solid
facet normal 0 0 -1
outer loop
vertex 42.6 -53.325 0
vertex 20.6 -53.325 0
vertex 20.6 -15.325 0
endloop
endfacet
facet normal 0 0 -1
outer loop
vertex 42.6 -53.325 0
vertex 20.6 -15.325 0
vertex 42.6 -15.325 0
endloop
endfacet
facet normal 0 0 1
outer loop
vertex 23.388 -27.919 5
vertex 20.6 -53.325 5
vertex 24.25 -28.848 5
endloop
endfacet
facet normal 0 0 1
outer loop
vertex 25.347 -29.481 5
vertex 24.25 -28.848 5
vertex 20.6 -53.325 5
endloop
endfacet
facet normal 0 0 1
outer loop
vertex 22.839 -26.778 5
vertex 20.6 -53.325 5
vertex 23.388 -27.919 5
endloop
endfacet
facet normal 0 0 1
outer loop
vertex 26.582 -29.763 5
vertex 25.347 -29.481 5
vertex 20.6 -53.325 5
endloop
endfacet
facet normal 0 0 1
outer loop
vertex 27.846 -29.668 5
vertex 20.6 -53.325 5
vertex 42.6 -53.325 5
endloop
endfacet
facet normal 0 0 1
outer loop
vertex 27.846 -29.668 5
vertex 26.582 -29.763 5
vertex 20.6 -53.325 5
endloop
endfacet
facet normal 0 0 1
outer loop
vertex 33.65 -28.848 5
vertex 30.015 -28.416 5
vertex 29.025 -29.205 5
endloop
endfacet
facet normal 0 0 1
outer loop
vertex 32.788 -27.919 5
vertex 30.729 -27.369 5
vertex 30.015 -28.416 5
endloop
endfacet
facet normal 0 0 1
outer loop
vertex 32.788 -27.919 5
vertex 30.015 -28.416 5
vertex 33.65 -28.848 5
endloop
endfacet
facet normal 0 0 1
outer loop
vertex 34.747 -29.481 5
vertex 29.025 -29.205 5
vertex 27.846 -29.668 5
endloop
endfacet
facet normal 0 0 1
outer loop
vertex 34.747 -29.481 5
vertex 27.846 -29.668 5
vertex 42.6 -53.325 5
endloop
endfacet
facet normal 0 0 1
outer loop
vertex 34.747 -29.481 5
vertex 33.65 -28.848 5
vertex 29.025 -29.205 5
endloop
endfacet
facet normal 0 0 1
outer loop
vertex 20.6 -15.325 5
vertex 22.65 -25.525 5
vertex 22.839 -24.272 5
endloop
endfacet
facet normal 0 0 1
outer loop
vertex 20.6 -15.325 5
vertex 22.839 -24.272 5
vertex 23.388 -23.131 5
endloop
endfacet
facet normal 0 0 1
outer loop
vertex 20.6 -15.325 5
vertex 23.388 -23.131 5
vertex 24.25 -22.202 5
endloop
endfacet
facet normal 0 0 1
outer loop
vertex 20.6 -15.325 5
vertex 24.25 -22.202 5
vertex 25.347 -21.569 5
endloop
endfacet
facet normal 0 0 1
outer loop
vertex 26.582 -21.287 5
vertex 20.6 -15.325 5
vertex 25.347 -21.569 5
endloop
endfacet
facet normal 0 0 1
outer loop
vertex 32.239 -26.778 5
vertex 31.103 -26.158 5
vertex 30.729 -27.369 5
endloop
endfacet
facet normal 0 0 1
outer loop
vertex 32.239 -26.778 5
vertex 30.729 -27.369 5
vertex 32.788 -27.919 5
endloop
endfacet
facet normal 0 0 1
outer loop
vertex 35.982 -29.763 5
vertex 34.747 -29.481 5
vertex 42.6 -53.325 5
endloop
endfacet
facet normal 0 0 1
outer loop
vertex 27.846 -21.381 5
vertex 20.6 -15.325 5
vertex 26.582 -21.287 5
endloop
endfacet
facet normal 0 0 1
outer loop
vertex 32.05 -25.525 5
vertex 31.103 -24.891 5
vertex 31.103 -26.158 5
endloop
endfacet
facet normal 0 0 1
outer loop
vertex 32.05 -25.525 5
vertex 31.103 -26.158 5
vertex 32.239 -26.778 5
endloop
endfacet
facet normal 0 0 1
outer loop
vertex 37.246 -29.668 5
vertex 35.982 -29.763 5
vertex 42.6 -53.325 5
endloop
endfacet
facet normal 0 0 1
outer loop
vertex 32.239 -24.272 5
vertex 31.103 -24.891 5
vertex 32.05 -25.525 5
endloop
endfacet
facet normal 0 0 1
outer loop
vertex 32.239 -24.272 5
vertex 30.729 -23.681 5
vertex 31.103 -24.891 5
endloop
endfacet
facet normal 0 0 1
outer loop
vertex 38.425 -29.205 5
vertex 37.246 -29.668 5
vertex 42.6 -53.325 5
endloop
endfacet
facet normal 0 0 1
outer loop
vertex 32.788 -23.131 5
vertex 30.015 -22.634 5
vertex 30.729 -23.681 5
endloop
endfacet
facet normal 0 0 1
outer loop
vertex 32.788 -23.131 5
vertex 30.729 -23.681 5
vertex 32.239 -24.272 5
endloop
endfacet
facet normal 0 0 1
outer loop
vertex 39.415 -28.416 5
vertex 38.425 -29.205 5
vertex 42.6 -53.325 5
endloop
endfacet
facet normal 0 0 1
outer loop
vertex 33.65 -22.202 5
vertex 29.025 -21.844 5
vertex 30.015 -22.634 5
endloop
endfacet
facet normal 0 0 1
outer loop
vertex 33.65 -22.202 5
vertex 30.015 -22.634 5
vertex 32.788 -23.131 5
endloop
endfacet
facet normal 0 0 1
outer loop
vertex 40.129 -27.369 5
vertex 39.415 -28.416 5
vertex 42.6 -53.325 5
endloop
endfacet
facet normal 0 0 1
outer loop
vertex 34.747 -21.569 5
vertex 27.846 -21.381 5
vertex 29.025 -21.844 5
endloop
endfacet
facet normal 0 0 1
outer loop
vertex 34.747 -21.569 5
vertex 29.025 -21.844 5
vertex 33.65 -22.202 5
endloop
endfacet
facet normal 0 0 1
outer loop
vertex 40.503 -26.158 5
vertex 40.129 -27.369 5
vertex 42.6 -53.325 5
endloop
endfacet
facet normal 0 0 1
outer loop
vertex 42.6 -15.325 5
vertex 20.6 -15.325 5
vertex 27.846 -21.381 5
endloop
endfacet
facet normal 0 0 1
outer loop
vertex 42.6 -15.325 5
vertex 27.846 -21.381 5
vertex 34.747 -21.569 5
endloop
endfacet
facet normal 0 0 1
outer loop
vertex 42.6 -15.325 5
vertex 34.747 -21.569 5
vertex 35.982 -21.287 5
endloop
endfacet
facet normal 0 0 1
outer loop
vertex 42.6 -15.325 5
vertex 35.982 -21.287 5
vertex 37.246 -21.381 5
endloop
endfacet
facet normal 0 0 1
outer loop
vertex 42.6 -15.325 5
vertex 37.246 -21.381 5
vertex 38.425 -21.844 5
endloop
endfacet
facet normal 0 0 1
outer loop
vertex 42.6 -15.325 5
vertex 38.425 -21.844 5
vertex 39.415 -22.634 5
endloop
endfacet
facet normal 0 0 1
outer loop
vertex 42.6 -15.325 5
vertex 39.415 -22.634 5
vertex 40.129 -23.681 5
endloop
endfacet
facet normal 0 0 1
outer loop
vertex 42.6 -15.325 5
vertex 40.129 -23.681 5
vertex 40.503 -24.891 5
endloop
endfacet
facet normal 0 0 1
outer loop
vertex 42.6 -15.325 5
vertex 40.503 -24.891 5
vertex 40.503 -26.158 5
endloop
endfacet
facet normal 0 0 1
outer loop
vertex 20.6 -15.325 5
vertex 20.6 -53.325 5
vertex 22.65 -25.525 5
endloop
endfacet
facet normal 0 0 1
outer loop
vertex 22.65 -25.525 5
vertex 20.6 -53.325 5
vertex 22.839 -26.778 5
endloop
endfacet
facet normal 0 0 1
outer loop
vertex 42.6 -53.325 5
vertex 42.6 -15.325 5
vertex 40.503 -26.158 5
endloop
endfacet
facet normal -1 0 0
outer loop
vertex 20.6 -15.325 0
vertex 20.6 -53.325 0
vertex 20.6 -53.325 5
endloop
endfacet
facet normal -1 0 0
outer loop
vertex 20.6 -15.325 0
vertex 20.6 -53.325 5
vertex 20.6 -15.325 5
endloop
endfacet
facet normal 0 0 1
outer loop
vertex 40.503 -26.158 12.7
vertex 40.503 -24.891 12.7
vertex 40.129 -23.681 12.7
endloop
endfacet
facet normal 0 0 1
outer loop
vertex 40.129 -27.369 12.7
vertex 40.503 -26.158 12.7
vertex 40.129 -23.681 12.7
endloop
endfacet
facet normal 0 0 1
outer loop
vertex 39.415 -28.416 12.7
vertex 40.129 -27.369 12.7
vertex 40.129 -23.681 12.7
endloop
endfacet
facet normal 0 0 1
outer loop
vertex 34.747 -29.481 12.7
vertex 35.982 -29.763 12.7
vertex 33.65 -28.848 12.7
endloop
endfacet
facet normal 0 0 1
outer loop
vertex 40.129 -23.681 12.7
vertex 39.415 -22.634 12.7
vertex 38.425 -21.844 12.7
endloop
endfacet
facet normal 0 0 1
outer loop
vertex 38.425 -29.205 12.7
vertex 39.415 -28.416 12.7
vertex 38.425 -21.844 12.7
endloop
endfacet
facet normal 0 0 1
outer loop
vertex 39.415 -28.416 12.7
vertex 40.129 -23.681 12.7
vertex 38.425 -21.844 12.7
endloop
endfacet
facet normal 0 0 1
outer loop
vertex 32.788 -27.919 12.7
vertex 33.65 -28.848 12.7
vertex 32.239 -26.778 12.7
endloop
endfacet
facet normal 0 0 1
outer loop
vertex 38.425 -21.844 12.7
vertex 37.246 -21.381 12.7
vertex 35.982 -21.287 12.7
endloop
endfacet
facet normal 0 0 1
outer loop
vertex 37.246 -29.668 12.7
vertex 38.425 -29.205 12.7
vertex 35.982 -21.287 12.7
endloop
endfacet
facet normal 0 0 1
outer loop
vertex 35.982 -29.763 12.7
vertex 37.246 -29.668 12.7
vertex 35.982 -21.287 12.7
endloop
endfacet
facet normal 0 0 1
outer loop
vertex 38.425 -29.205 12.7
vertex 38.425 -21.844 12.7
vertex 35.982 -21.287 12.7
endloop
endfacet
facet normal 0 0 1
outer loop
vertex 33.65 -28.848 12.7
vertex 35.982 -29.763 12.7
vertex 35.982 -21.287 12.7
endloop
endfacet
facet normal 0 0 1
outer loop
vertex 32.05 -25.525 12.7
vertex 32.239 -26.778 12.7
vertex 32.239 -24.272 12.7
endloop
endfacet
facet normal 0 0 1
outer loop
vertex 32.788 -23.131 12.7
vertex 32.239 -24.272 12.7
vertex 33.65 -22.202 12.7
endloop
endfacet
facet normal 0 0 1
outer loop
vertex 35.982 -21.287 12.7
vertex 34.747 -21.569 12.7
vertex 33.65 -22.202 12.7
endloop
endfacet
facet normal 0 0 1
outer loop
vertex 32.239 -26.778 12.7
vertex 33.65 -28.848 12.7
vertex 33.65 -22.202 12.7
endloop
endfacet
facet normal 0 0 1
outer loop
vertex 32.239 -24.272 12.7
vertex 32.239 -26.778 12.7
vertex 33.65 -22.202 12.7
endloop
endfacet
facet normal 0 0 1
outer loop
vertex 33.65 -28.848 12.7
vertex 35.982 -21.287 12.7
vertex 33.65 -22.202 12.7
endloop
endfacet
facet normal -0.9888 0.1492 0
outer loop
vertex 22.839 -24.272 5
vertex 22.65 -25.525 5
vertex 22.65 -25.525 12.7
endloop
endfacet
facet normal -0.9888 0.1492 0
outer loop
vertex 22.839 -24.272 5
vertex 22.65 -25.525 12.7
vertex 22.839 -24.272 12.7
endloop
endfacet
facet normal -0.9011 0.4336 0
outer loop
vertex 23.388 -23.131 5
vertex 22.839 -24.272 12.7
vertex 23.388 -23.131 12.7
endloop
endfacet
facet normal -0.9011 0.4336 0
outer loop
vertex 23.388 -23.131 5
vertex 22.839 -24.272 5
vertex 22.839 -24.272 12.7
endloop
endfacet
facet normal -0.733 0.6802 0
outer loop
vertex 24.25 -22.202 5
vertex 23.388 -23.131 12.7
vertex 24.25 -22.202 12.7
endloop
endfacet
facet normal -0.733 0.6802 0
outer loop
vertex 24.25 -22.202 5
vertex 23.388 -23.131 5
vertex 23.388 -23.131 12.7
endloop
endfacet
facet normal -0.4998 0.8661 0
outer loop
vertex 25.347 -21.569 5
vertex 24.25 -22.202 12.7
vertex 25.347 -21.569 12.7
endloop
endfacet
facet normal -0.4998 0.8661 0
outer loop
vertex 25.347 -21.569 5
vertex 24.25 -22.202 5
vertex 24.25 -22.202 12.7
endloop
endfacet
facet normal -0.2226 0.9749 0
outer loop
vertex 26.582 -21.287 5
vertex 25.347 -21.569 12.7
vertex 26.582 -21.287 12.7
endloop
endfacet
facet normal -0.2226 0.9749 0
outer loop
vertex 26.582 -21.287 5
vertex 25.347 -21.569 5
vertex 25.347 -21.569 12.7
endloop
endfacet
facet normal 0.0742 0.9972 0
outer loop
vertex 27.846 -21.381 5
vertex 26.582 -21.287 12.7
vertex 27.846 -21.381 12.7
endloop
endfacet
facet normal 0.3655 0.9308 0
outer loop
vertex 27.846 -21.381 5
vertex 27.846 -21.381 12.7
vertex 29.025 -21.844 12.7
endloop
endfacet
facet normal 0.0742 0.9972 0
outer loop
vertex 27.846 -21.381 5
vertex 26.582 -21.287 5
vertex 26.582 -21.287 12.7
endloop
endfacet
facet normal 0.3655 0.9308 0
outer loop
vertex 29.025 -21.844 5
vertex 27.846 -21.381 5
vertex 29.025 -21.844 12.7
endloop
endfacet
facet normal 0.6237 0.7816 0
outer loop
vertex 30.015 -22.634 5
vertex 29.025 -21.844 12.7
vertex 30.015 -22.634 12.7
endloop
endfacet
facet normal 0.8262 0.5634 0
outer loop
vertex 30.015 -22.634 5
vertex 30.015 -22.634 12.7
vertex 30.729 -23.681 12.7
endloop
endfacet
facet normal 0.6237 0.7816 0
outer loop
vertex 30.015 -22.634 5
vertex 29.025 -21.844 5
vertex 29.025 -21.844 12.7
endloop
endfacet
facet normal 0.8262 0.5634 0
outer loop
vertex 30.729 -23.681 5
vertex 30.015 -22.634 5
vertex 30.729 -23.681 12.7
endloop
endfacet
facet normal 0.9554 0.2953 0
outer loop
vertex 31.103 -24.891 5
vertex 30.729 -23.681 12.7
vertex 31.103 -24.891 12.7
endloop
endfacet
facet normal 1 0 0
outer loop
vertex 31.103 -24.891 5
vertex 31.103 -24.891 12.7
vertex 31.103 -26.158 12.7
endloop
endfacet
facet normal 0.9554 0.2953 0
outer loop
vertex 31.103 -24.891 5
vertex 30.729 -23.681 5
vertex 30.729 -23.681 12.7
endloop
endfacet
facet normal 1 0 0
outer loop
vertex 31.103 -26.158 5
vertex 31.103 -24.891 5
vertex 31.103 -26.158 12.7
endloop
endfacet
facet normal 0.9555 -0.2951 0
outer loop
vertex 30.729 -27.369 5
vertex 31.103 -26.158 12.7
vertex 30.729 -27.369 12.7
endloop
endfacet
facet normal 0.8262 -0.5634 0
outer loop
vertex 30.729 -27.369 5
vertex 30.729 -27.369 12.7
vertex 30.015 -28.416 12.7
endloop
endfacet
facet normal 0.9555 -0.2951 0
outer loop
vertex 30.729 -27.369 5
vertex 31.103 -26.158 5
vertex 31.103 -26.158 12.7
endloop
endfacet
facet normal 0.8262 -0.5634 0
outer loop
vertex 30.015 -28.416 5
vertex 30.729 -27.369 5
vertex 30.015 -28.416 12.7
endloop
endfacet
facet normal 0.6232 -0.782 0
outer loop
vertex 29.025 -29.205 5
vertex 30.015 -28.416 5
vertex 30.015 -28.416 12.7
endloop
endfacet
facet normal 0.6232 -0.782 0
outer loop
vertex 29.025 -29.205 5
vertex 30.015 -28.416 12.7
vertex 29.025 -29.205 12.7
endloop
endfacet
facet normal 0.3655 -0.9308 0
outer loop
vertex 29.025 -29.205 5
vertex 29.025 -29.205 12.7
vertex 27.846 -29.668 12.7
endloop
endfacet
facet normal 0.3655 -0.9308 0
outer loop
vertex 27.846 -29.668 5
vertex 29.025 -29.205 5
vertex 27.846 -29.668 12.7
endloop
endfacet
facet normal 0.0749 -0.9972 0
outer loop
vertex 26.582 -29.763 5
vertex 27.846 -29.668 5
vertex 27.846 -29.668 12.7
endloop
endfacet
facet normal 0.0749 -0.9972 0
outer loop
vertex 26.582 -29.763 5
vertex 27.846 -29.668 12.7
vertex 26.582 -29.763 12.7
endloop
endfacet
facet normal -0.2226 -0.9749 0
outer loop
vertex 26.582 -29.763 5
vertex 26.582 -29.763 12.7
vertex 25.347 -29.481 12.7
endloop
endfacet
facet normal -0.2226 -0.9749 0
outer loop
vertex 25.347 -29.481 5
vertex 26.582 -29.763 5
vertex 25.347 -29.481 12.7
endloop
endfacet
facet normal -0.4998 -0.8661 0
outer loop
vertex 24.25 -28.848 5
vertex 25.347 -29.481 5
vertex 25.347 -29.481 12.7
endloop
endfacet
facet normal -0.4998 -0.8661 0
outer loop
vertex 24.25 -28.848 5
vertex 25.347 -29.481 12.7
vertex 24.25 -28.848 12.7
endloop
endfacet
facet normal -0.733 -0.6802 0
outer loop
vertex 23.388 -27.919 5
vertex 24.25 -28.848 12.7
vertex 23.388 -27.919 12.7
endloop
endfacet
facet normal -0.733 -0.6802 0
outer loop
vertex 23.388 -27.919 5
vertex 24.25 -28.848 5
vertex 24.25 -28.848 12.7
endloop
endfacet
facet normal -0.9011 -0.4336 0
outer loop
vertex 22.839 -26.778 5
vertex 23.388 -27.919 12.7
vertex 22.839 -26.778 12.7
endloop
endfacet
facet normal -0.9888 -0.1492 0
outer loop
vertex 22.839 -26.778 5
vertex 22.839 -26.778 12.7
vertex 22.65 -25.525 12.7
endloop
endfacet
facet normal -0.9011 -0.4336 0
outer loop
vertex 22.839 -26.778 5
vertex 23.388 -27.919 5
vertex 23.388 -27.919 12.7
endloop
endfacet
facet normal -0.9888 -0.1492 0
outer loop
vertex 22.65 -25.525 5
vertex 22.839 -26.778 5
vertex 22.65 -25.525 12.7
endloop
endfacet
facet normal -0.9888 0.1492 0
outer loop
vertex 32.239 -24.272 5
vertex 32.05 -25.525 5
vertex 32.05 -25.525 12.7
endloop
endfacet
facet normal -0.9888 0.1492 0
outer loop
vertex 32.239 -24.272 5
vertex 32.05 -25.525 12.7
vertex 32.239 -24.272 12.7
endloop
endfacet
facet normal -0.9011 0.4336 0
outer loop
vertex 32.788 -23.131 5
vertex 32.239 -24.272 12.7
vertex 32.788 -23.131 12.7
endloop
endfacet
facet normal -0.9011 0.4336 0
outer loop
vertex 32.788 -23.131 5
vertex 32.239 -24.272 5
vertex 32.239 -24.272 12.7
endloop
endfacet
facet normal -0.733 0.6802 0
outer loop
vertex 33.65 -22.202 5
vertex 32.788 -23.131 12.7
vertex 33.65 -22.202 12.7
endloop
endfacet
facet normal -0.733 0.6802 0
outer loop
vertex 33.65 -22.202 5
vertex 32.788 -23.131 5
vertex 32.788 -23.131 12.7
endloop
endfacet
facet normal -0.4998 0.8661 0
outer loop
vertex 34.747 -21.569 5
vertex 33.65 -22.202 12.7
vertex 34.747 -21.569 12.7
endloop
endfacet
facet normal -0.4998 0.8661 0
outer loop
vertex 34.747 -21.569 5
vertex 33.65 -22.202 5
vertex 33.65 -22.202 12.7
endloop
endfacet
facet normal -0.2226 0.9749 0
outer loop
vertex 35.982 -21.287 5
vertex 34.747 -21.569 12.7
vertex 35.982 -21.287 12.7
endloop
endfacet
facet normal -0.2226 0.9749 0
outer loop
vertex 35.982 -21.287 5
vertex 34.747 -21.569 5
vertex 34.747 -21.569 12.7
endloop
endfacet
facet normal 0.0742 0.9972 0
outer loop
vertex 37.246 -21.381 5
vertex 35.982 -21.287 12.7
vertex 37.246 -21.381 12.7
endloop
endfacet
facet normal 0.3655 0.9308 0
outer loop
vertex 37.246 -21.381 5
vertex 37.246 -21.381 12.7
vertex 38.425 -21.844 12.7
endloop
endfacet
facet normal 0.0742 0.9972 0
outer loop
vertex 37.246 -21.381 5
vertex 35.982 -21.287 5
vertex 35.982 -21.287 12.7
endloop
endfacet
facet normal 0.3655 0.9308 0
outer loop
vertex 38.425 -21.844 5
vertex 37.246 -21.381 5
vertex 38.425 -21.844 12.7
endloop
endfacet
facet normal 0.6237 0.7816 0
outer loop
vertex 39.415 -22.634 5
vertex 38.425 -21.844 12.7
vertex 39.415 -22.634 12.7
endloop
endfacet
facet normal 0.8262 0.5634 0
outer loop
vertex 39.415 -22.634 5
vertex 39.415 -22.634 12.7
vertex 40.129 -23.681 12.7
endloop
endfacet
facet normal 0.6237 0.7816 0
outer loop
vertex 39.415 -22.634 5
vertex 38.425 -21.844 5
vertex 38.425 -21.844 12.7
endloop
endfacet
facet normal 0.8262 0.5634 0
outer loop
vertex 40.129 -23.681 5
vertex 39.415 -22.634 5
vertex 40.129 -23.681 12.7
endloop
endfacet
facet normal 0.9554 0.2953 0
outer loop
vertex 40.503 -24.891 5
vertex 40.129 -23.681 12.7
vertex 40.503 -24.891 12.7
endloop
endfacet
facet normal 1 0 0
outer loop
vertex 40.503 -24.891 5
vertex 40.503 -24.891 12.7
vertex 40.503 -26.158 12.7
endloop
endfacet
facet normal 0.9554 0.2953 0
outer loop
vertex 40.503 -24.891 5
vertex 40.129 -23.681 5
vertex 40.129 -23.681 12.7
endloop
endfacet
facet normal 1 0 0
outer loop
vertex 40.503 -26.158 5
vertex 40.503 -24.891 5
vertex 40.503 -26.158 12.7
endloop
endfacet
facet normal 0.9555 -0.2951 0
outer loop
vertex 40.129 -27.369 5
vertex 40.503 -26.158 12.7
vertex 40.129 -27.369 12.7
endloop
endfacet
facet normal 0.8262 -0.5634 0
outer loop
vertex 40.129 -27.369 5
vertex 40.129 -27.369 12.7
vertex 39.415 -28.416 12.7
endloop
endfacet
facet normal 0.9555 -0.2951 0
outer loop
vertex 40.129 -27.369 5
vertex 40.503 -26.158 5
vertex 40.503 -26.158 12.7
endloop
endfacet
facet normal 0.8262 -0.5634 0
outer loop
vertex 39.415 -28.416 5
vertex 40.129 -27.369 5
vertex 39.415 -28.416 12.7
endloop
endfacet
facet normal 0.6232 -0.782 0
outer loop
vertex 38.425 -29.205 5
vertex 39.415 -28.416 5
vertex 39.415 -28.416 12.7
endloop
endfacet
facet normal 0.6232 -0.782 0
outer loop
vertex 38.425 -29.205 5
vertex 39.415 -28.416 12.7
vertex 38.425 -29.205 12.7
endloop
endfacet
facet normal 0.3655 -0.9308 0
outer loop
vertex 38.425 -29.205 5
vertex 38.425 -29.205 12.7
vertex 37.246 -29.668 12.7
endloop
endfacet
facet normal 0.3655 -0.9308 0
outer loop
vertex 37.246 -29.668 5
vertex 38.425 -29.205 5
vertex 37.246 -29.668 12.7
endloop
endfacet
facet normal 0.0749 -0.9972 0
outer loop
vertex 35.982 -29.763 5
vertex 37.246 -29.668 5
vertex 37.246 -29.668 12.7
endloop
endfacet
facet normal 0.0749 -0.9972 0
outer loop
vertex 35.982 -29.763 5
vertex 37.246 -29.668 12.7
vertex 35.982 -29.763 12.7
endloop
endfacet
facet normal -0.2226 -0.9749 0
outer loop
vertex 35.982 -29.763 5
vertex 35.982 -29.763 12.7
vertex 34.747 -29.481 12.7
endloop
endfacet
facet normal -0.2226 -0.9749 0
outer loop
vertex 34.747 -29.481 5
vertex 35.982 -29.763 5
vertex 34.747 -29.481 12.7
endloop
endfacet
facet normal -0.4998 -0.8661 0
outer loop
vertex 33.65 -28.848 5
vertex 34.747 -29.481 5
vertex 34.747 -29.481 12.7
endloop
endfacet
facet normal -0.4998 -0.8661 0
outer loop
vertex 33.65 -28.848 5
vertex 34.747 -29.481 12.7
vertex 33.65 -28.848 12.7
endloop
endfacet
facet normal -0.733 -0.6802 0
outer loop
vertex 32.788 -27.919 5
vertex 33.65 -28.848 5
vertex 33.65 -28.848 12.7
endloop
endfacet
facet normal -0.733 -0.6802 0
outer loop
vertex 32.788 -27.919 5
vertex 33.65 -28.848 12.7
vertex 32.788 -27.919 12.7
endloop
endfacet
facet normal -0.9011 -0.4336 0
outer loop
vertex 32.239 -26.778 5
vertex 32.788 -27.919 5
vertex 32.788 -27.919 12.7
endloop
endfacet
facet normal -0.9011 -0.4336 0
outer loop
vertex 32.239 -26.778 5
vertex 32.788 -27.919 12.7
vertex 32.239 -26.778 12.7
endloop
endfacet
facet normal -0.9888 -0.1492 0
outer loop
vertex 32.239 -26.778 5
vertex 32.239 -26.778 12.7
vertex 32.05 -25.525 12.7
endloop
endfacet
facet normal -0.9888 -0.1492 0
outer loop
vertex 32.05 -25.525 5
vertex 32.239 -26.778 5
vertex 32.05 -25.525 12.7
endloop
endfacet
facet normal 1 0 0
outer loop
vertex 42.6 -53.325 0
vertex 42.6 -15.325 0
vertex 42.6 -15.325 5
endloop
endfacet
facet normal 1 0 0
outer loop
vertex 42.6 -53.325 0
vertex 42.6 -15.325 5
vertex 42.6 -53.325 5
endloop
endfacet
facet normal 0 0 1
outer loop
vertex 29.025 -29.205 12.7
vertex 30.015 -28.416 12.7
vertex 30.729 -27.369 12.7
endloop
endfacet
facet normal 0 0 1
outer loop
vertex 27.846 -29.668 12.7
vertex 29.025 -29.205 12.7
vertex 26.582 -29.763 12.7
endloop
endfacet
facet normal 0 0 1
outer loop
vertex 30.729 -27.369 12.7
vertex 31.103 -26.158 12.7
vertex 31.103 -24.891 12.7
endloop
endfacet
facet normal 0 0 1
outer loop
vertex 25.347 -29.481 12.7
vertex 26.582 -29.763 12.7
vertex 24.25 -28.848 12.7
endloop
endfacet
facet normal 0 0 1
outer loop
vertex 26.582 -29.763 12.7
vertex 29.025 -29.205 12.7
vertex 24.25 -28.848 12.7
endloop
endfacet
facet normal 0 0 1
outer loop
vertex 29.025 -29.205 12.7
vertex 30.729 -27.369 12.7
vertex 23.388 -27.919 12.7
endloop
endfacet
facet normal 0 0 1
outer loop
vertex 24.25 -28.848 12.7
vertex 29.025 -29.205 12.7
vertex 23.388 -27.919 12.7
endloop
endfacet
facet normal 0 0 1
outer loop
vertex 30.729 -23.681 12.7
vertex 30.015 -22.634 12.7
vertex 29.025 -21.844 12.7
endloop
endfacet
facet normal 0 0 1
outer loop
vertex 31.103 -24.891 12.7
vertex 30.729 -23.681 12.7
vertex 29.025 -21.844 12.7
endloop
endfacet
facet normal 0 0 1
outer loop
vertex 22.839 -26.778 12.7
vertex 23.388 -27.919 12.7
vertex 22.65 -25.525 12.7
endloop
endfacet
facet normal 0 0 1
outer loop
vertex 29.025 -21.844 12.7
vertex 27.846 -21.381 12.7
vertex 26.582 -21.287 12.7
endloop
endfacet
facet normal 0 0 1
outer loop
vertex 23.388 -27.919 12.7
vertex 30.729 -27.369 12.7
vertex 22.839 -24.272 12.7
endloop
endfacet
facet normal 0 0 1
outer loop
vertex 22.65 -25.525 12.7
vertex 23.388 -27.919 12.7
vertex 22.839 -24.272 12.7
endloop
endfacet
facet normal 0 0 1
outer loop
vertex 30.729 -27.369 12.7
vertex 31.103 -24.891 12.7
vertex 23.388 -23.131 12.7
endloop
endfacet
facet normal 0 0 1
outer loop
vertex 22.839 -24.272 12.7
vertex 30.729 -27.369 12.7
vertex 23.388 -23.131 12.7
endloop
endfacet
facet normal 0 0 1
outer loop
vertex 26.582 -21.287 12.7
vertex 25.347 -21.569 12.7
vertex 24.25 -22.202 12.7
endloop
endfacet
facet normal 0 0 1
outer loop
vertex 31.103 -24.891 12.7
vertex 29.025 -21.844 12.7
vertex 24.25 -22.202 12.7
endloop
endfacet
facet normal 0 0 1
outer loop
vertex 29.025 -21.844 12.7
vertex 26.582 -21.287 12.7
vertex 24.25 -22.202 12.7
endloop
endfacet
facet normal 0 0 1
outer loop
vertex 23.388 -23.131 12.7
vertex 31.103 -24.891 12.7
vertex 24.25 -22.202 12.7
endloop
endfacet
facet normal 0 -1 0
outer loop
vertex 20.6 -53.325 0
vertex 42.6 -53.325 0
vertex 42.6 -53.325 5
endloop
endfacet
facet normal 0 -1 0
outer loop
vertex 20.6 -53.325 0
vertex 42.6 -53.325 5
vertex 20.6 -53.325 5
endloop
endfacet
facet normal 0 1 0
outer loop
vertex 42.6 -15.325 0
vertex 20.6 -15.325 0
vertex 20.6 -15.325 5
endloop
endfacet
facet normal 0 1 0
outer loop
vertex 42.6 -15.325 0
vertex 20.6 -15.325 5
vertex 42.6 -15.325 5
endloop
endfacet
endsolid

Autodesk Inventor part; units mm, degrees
ref_plane "YZ Plane" through (0, 0, 0) normal (1, 0, 0) x (0, 1, 0)
ref_plane "XZ Plane" through (0, 0, 0) normal (0, 1, 0) x (-1, 0, 0)
ref_plane "XY Plane" through (0, 0, 0) normal (0, 0, 1) x (1, 0, 0)
sketch "スケッチ1" plane through (0, 0, 0) normal (0, 0, 1) x (1, 0, 0)
  line L0 (0, 0) -> (62, 0) construction
  line L1 (62, 0) -> (62, -62) construction
  line L2 (62, -62) -> (0, -62) construction
  line L3 (0, -62) -> (0, 0) construction
  line L4 (20.6, -15.3248) -> (42.6, -15.3248)
  line L5 (42.6, -15.3248) -> (42.6, -53.3248)
  line L6 (42.6, -53.3248) -> (20.6, -53.3248)
  line L7 (20.6, -53.3248) -> (20.6, -15.3248)
  circle A0 centre (26.9, -25.5248) radius 4.25
  circle A1 centre (36.3, -25.5248) radius 4.25
  dimension "d1" = 22
  dimension "d2" = 38
  dimension "d3" = 62
  dimension "d12" = 15.3248
  dimension "d16" = 20.6
  dimension "d17" = 8.5
  dimension "d18" = 8.5
  dimension "d19" = 6.3
  dimension "d25" = 10.2
  dimension "d31" = 6.3
extrude "押し出し1" add sketch "スケッチ1" along normal blind 5
sketch "スケッチ2" plane through (0, 0, 0) normal (0, 0, -1) x (-1, 0, 0)
  circle A0 centre (-36.3, -25.5248) radius 4.25 projected
  circle A1 centre (-26.9, -25.5248) radius 4.25 projected
  point P0 (0, 0)
extrude "押し出し2" add sketch "スケッチ2" against normal blind 12.7
equation "\"d17\" = d18"
equation "\"d31\" = d19"
properties part number "sidewindermicro2"
